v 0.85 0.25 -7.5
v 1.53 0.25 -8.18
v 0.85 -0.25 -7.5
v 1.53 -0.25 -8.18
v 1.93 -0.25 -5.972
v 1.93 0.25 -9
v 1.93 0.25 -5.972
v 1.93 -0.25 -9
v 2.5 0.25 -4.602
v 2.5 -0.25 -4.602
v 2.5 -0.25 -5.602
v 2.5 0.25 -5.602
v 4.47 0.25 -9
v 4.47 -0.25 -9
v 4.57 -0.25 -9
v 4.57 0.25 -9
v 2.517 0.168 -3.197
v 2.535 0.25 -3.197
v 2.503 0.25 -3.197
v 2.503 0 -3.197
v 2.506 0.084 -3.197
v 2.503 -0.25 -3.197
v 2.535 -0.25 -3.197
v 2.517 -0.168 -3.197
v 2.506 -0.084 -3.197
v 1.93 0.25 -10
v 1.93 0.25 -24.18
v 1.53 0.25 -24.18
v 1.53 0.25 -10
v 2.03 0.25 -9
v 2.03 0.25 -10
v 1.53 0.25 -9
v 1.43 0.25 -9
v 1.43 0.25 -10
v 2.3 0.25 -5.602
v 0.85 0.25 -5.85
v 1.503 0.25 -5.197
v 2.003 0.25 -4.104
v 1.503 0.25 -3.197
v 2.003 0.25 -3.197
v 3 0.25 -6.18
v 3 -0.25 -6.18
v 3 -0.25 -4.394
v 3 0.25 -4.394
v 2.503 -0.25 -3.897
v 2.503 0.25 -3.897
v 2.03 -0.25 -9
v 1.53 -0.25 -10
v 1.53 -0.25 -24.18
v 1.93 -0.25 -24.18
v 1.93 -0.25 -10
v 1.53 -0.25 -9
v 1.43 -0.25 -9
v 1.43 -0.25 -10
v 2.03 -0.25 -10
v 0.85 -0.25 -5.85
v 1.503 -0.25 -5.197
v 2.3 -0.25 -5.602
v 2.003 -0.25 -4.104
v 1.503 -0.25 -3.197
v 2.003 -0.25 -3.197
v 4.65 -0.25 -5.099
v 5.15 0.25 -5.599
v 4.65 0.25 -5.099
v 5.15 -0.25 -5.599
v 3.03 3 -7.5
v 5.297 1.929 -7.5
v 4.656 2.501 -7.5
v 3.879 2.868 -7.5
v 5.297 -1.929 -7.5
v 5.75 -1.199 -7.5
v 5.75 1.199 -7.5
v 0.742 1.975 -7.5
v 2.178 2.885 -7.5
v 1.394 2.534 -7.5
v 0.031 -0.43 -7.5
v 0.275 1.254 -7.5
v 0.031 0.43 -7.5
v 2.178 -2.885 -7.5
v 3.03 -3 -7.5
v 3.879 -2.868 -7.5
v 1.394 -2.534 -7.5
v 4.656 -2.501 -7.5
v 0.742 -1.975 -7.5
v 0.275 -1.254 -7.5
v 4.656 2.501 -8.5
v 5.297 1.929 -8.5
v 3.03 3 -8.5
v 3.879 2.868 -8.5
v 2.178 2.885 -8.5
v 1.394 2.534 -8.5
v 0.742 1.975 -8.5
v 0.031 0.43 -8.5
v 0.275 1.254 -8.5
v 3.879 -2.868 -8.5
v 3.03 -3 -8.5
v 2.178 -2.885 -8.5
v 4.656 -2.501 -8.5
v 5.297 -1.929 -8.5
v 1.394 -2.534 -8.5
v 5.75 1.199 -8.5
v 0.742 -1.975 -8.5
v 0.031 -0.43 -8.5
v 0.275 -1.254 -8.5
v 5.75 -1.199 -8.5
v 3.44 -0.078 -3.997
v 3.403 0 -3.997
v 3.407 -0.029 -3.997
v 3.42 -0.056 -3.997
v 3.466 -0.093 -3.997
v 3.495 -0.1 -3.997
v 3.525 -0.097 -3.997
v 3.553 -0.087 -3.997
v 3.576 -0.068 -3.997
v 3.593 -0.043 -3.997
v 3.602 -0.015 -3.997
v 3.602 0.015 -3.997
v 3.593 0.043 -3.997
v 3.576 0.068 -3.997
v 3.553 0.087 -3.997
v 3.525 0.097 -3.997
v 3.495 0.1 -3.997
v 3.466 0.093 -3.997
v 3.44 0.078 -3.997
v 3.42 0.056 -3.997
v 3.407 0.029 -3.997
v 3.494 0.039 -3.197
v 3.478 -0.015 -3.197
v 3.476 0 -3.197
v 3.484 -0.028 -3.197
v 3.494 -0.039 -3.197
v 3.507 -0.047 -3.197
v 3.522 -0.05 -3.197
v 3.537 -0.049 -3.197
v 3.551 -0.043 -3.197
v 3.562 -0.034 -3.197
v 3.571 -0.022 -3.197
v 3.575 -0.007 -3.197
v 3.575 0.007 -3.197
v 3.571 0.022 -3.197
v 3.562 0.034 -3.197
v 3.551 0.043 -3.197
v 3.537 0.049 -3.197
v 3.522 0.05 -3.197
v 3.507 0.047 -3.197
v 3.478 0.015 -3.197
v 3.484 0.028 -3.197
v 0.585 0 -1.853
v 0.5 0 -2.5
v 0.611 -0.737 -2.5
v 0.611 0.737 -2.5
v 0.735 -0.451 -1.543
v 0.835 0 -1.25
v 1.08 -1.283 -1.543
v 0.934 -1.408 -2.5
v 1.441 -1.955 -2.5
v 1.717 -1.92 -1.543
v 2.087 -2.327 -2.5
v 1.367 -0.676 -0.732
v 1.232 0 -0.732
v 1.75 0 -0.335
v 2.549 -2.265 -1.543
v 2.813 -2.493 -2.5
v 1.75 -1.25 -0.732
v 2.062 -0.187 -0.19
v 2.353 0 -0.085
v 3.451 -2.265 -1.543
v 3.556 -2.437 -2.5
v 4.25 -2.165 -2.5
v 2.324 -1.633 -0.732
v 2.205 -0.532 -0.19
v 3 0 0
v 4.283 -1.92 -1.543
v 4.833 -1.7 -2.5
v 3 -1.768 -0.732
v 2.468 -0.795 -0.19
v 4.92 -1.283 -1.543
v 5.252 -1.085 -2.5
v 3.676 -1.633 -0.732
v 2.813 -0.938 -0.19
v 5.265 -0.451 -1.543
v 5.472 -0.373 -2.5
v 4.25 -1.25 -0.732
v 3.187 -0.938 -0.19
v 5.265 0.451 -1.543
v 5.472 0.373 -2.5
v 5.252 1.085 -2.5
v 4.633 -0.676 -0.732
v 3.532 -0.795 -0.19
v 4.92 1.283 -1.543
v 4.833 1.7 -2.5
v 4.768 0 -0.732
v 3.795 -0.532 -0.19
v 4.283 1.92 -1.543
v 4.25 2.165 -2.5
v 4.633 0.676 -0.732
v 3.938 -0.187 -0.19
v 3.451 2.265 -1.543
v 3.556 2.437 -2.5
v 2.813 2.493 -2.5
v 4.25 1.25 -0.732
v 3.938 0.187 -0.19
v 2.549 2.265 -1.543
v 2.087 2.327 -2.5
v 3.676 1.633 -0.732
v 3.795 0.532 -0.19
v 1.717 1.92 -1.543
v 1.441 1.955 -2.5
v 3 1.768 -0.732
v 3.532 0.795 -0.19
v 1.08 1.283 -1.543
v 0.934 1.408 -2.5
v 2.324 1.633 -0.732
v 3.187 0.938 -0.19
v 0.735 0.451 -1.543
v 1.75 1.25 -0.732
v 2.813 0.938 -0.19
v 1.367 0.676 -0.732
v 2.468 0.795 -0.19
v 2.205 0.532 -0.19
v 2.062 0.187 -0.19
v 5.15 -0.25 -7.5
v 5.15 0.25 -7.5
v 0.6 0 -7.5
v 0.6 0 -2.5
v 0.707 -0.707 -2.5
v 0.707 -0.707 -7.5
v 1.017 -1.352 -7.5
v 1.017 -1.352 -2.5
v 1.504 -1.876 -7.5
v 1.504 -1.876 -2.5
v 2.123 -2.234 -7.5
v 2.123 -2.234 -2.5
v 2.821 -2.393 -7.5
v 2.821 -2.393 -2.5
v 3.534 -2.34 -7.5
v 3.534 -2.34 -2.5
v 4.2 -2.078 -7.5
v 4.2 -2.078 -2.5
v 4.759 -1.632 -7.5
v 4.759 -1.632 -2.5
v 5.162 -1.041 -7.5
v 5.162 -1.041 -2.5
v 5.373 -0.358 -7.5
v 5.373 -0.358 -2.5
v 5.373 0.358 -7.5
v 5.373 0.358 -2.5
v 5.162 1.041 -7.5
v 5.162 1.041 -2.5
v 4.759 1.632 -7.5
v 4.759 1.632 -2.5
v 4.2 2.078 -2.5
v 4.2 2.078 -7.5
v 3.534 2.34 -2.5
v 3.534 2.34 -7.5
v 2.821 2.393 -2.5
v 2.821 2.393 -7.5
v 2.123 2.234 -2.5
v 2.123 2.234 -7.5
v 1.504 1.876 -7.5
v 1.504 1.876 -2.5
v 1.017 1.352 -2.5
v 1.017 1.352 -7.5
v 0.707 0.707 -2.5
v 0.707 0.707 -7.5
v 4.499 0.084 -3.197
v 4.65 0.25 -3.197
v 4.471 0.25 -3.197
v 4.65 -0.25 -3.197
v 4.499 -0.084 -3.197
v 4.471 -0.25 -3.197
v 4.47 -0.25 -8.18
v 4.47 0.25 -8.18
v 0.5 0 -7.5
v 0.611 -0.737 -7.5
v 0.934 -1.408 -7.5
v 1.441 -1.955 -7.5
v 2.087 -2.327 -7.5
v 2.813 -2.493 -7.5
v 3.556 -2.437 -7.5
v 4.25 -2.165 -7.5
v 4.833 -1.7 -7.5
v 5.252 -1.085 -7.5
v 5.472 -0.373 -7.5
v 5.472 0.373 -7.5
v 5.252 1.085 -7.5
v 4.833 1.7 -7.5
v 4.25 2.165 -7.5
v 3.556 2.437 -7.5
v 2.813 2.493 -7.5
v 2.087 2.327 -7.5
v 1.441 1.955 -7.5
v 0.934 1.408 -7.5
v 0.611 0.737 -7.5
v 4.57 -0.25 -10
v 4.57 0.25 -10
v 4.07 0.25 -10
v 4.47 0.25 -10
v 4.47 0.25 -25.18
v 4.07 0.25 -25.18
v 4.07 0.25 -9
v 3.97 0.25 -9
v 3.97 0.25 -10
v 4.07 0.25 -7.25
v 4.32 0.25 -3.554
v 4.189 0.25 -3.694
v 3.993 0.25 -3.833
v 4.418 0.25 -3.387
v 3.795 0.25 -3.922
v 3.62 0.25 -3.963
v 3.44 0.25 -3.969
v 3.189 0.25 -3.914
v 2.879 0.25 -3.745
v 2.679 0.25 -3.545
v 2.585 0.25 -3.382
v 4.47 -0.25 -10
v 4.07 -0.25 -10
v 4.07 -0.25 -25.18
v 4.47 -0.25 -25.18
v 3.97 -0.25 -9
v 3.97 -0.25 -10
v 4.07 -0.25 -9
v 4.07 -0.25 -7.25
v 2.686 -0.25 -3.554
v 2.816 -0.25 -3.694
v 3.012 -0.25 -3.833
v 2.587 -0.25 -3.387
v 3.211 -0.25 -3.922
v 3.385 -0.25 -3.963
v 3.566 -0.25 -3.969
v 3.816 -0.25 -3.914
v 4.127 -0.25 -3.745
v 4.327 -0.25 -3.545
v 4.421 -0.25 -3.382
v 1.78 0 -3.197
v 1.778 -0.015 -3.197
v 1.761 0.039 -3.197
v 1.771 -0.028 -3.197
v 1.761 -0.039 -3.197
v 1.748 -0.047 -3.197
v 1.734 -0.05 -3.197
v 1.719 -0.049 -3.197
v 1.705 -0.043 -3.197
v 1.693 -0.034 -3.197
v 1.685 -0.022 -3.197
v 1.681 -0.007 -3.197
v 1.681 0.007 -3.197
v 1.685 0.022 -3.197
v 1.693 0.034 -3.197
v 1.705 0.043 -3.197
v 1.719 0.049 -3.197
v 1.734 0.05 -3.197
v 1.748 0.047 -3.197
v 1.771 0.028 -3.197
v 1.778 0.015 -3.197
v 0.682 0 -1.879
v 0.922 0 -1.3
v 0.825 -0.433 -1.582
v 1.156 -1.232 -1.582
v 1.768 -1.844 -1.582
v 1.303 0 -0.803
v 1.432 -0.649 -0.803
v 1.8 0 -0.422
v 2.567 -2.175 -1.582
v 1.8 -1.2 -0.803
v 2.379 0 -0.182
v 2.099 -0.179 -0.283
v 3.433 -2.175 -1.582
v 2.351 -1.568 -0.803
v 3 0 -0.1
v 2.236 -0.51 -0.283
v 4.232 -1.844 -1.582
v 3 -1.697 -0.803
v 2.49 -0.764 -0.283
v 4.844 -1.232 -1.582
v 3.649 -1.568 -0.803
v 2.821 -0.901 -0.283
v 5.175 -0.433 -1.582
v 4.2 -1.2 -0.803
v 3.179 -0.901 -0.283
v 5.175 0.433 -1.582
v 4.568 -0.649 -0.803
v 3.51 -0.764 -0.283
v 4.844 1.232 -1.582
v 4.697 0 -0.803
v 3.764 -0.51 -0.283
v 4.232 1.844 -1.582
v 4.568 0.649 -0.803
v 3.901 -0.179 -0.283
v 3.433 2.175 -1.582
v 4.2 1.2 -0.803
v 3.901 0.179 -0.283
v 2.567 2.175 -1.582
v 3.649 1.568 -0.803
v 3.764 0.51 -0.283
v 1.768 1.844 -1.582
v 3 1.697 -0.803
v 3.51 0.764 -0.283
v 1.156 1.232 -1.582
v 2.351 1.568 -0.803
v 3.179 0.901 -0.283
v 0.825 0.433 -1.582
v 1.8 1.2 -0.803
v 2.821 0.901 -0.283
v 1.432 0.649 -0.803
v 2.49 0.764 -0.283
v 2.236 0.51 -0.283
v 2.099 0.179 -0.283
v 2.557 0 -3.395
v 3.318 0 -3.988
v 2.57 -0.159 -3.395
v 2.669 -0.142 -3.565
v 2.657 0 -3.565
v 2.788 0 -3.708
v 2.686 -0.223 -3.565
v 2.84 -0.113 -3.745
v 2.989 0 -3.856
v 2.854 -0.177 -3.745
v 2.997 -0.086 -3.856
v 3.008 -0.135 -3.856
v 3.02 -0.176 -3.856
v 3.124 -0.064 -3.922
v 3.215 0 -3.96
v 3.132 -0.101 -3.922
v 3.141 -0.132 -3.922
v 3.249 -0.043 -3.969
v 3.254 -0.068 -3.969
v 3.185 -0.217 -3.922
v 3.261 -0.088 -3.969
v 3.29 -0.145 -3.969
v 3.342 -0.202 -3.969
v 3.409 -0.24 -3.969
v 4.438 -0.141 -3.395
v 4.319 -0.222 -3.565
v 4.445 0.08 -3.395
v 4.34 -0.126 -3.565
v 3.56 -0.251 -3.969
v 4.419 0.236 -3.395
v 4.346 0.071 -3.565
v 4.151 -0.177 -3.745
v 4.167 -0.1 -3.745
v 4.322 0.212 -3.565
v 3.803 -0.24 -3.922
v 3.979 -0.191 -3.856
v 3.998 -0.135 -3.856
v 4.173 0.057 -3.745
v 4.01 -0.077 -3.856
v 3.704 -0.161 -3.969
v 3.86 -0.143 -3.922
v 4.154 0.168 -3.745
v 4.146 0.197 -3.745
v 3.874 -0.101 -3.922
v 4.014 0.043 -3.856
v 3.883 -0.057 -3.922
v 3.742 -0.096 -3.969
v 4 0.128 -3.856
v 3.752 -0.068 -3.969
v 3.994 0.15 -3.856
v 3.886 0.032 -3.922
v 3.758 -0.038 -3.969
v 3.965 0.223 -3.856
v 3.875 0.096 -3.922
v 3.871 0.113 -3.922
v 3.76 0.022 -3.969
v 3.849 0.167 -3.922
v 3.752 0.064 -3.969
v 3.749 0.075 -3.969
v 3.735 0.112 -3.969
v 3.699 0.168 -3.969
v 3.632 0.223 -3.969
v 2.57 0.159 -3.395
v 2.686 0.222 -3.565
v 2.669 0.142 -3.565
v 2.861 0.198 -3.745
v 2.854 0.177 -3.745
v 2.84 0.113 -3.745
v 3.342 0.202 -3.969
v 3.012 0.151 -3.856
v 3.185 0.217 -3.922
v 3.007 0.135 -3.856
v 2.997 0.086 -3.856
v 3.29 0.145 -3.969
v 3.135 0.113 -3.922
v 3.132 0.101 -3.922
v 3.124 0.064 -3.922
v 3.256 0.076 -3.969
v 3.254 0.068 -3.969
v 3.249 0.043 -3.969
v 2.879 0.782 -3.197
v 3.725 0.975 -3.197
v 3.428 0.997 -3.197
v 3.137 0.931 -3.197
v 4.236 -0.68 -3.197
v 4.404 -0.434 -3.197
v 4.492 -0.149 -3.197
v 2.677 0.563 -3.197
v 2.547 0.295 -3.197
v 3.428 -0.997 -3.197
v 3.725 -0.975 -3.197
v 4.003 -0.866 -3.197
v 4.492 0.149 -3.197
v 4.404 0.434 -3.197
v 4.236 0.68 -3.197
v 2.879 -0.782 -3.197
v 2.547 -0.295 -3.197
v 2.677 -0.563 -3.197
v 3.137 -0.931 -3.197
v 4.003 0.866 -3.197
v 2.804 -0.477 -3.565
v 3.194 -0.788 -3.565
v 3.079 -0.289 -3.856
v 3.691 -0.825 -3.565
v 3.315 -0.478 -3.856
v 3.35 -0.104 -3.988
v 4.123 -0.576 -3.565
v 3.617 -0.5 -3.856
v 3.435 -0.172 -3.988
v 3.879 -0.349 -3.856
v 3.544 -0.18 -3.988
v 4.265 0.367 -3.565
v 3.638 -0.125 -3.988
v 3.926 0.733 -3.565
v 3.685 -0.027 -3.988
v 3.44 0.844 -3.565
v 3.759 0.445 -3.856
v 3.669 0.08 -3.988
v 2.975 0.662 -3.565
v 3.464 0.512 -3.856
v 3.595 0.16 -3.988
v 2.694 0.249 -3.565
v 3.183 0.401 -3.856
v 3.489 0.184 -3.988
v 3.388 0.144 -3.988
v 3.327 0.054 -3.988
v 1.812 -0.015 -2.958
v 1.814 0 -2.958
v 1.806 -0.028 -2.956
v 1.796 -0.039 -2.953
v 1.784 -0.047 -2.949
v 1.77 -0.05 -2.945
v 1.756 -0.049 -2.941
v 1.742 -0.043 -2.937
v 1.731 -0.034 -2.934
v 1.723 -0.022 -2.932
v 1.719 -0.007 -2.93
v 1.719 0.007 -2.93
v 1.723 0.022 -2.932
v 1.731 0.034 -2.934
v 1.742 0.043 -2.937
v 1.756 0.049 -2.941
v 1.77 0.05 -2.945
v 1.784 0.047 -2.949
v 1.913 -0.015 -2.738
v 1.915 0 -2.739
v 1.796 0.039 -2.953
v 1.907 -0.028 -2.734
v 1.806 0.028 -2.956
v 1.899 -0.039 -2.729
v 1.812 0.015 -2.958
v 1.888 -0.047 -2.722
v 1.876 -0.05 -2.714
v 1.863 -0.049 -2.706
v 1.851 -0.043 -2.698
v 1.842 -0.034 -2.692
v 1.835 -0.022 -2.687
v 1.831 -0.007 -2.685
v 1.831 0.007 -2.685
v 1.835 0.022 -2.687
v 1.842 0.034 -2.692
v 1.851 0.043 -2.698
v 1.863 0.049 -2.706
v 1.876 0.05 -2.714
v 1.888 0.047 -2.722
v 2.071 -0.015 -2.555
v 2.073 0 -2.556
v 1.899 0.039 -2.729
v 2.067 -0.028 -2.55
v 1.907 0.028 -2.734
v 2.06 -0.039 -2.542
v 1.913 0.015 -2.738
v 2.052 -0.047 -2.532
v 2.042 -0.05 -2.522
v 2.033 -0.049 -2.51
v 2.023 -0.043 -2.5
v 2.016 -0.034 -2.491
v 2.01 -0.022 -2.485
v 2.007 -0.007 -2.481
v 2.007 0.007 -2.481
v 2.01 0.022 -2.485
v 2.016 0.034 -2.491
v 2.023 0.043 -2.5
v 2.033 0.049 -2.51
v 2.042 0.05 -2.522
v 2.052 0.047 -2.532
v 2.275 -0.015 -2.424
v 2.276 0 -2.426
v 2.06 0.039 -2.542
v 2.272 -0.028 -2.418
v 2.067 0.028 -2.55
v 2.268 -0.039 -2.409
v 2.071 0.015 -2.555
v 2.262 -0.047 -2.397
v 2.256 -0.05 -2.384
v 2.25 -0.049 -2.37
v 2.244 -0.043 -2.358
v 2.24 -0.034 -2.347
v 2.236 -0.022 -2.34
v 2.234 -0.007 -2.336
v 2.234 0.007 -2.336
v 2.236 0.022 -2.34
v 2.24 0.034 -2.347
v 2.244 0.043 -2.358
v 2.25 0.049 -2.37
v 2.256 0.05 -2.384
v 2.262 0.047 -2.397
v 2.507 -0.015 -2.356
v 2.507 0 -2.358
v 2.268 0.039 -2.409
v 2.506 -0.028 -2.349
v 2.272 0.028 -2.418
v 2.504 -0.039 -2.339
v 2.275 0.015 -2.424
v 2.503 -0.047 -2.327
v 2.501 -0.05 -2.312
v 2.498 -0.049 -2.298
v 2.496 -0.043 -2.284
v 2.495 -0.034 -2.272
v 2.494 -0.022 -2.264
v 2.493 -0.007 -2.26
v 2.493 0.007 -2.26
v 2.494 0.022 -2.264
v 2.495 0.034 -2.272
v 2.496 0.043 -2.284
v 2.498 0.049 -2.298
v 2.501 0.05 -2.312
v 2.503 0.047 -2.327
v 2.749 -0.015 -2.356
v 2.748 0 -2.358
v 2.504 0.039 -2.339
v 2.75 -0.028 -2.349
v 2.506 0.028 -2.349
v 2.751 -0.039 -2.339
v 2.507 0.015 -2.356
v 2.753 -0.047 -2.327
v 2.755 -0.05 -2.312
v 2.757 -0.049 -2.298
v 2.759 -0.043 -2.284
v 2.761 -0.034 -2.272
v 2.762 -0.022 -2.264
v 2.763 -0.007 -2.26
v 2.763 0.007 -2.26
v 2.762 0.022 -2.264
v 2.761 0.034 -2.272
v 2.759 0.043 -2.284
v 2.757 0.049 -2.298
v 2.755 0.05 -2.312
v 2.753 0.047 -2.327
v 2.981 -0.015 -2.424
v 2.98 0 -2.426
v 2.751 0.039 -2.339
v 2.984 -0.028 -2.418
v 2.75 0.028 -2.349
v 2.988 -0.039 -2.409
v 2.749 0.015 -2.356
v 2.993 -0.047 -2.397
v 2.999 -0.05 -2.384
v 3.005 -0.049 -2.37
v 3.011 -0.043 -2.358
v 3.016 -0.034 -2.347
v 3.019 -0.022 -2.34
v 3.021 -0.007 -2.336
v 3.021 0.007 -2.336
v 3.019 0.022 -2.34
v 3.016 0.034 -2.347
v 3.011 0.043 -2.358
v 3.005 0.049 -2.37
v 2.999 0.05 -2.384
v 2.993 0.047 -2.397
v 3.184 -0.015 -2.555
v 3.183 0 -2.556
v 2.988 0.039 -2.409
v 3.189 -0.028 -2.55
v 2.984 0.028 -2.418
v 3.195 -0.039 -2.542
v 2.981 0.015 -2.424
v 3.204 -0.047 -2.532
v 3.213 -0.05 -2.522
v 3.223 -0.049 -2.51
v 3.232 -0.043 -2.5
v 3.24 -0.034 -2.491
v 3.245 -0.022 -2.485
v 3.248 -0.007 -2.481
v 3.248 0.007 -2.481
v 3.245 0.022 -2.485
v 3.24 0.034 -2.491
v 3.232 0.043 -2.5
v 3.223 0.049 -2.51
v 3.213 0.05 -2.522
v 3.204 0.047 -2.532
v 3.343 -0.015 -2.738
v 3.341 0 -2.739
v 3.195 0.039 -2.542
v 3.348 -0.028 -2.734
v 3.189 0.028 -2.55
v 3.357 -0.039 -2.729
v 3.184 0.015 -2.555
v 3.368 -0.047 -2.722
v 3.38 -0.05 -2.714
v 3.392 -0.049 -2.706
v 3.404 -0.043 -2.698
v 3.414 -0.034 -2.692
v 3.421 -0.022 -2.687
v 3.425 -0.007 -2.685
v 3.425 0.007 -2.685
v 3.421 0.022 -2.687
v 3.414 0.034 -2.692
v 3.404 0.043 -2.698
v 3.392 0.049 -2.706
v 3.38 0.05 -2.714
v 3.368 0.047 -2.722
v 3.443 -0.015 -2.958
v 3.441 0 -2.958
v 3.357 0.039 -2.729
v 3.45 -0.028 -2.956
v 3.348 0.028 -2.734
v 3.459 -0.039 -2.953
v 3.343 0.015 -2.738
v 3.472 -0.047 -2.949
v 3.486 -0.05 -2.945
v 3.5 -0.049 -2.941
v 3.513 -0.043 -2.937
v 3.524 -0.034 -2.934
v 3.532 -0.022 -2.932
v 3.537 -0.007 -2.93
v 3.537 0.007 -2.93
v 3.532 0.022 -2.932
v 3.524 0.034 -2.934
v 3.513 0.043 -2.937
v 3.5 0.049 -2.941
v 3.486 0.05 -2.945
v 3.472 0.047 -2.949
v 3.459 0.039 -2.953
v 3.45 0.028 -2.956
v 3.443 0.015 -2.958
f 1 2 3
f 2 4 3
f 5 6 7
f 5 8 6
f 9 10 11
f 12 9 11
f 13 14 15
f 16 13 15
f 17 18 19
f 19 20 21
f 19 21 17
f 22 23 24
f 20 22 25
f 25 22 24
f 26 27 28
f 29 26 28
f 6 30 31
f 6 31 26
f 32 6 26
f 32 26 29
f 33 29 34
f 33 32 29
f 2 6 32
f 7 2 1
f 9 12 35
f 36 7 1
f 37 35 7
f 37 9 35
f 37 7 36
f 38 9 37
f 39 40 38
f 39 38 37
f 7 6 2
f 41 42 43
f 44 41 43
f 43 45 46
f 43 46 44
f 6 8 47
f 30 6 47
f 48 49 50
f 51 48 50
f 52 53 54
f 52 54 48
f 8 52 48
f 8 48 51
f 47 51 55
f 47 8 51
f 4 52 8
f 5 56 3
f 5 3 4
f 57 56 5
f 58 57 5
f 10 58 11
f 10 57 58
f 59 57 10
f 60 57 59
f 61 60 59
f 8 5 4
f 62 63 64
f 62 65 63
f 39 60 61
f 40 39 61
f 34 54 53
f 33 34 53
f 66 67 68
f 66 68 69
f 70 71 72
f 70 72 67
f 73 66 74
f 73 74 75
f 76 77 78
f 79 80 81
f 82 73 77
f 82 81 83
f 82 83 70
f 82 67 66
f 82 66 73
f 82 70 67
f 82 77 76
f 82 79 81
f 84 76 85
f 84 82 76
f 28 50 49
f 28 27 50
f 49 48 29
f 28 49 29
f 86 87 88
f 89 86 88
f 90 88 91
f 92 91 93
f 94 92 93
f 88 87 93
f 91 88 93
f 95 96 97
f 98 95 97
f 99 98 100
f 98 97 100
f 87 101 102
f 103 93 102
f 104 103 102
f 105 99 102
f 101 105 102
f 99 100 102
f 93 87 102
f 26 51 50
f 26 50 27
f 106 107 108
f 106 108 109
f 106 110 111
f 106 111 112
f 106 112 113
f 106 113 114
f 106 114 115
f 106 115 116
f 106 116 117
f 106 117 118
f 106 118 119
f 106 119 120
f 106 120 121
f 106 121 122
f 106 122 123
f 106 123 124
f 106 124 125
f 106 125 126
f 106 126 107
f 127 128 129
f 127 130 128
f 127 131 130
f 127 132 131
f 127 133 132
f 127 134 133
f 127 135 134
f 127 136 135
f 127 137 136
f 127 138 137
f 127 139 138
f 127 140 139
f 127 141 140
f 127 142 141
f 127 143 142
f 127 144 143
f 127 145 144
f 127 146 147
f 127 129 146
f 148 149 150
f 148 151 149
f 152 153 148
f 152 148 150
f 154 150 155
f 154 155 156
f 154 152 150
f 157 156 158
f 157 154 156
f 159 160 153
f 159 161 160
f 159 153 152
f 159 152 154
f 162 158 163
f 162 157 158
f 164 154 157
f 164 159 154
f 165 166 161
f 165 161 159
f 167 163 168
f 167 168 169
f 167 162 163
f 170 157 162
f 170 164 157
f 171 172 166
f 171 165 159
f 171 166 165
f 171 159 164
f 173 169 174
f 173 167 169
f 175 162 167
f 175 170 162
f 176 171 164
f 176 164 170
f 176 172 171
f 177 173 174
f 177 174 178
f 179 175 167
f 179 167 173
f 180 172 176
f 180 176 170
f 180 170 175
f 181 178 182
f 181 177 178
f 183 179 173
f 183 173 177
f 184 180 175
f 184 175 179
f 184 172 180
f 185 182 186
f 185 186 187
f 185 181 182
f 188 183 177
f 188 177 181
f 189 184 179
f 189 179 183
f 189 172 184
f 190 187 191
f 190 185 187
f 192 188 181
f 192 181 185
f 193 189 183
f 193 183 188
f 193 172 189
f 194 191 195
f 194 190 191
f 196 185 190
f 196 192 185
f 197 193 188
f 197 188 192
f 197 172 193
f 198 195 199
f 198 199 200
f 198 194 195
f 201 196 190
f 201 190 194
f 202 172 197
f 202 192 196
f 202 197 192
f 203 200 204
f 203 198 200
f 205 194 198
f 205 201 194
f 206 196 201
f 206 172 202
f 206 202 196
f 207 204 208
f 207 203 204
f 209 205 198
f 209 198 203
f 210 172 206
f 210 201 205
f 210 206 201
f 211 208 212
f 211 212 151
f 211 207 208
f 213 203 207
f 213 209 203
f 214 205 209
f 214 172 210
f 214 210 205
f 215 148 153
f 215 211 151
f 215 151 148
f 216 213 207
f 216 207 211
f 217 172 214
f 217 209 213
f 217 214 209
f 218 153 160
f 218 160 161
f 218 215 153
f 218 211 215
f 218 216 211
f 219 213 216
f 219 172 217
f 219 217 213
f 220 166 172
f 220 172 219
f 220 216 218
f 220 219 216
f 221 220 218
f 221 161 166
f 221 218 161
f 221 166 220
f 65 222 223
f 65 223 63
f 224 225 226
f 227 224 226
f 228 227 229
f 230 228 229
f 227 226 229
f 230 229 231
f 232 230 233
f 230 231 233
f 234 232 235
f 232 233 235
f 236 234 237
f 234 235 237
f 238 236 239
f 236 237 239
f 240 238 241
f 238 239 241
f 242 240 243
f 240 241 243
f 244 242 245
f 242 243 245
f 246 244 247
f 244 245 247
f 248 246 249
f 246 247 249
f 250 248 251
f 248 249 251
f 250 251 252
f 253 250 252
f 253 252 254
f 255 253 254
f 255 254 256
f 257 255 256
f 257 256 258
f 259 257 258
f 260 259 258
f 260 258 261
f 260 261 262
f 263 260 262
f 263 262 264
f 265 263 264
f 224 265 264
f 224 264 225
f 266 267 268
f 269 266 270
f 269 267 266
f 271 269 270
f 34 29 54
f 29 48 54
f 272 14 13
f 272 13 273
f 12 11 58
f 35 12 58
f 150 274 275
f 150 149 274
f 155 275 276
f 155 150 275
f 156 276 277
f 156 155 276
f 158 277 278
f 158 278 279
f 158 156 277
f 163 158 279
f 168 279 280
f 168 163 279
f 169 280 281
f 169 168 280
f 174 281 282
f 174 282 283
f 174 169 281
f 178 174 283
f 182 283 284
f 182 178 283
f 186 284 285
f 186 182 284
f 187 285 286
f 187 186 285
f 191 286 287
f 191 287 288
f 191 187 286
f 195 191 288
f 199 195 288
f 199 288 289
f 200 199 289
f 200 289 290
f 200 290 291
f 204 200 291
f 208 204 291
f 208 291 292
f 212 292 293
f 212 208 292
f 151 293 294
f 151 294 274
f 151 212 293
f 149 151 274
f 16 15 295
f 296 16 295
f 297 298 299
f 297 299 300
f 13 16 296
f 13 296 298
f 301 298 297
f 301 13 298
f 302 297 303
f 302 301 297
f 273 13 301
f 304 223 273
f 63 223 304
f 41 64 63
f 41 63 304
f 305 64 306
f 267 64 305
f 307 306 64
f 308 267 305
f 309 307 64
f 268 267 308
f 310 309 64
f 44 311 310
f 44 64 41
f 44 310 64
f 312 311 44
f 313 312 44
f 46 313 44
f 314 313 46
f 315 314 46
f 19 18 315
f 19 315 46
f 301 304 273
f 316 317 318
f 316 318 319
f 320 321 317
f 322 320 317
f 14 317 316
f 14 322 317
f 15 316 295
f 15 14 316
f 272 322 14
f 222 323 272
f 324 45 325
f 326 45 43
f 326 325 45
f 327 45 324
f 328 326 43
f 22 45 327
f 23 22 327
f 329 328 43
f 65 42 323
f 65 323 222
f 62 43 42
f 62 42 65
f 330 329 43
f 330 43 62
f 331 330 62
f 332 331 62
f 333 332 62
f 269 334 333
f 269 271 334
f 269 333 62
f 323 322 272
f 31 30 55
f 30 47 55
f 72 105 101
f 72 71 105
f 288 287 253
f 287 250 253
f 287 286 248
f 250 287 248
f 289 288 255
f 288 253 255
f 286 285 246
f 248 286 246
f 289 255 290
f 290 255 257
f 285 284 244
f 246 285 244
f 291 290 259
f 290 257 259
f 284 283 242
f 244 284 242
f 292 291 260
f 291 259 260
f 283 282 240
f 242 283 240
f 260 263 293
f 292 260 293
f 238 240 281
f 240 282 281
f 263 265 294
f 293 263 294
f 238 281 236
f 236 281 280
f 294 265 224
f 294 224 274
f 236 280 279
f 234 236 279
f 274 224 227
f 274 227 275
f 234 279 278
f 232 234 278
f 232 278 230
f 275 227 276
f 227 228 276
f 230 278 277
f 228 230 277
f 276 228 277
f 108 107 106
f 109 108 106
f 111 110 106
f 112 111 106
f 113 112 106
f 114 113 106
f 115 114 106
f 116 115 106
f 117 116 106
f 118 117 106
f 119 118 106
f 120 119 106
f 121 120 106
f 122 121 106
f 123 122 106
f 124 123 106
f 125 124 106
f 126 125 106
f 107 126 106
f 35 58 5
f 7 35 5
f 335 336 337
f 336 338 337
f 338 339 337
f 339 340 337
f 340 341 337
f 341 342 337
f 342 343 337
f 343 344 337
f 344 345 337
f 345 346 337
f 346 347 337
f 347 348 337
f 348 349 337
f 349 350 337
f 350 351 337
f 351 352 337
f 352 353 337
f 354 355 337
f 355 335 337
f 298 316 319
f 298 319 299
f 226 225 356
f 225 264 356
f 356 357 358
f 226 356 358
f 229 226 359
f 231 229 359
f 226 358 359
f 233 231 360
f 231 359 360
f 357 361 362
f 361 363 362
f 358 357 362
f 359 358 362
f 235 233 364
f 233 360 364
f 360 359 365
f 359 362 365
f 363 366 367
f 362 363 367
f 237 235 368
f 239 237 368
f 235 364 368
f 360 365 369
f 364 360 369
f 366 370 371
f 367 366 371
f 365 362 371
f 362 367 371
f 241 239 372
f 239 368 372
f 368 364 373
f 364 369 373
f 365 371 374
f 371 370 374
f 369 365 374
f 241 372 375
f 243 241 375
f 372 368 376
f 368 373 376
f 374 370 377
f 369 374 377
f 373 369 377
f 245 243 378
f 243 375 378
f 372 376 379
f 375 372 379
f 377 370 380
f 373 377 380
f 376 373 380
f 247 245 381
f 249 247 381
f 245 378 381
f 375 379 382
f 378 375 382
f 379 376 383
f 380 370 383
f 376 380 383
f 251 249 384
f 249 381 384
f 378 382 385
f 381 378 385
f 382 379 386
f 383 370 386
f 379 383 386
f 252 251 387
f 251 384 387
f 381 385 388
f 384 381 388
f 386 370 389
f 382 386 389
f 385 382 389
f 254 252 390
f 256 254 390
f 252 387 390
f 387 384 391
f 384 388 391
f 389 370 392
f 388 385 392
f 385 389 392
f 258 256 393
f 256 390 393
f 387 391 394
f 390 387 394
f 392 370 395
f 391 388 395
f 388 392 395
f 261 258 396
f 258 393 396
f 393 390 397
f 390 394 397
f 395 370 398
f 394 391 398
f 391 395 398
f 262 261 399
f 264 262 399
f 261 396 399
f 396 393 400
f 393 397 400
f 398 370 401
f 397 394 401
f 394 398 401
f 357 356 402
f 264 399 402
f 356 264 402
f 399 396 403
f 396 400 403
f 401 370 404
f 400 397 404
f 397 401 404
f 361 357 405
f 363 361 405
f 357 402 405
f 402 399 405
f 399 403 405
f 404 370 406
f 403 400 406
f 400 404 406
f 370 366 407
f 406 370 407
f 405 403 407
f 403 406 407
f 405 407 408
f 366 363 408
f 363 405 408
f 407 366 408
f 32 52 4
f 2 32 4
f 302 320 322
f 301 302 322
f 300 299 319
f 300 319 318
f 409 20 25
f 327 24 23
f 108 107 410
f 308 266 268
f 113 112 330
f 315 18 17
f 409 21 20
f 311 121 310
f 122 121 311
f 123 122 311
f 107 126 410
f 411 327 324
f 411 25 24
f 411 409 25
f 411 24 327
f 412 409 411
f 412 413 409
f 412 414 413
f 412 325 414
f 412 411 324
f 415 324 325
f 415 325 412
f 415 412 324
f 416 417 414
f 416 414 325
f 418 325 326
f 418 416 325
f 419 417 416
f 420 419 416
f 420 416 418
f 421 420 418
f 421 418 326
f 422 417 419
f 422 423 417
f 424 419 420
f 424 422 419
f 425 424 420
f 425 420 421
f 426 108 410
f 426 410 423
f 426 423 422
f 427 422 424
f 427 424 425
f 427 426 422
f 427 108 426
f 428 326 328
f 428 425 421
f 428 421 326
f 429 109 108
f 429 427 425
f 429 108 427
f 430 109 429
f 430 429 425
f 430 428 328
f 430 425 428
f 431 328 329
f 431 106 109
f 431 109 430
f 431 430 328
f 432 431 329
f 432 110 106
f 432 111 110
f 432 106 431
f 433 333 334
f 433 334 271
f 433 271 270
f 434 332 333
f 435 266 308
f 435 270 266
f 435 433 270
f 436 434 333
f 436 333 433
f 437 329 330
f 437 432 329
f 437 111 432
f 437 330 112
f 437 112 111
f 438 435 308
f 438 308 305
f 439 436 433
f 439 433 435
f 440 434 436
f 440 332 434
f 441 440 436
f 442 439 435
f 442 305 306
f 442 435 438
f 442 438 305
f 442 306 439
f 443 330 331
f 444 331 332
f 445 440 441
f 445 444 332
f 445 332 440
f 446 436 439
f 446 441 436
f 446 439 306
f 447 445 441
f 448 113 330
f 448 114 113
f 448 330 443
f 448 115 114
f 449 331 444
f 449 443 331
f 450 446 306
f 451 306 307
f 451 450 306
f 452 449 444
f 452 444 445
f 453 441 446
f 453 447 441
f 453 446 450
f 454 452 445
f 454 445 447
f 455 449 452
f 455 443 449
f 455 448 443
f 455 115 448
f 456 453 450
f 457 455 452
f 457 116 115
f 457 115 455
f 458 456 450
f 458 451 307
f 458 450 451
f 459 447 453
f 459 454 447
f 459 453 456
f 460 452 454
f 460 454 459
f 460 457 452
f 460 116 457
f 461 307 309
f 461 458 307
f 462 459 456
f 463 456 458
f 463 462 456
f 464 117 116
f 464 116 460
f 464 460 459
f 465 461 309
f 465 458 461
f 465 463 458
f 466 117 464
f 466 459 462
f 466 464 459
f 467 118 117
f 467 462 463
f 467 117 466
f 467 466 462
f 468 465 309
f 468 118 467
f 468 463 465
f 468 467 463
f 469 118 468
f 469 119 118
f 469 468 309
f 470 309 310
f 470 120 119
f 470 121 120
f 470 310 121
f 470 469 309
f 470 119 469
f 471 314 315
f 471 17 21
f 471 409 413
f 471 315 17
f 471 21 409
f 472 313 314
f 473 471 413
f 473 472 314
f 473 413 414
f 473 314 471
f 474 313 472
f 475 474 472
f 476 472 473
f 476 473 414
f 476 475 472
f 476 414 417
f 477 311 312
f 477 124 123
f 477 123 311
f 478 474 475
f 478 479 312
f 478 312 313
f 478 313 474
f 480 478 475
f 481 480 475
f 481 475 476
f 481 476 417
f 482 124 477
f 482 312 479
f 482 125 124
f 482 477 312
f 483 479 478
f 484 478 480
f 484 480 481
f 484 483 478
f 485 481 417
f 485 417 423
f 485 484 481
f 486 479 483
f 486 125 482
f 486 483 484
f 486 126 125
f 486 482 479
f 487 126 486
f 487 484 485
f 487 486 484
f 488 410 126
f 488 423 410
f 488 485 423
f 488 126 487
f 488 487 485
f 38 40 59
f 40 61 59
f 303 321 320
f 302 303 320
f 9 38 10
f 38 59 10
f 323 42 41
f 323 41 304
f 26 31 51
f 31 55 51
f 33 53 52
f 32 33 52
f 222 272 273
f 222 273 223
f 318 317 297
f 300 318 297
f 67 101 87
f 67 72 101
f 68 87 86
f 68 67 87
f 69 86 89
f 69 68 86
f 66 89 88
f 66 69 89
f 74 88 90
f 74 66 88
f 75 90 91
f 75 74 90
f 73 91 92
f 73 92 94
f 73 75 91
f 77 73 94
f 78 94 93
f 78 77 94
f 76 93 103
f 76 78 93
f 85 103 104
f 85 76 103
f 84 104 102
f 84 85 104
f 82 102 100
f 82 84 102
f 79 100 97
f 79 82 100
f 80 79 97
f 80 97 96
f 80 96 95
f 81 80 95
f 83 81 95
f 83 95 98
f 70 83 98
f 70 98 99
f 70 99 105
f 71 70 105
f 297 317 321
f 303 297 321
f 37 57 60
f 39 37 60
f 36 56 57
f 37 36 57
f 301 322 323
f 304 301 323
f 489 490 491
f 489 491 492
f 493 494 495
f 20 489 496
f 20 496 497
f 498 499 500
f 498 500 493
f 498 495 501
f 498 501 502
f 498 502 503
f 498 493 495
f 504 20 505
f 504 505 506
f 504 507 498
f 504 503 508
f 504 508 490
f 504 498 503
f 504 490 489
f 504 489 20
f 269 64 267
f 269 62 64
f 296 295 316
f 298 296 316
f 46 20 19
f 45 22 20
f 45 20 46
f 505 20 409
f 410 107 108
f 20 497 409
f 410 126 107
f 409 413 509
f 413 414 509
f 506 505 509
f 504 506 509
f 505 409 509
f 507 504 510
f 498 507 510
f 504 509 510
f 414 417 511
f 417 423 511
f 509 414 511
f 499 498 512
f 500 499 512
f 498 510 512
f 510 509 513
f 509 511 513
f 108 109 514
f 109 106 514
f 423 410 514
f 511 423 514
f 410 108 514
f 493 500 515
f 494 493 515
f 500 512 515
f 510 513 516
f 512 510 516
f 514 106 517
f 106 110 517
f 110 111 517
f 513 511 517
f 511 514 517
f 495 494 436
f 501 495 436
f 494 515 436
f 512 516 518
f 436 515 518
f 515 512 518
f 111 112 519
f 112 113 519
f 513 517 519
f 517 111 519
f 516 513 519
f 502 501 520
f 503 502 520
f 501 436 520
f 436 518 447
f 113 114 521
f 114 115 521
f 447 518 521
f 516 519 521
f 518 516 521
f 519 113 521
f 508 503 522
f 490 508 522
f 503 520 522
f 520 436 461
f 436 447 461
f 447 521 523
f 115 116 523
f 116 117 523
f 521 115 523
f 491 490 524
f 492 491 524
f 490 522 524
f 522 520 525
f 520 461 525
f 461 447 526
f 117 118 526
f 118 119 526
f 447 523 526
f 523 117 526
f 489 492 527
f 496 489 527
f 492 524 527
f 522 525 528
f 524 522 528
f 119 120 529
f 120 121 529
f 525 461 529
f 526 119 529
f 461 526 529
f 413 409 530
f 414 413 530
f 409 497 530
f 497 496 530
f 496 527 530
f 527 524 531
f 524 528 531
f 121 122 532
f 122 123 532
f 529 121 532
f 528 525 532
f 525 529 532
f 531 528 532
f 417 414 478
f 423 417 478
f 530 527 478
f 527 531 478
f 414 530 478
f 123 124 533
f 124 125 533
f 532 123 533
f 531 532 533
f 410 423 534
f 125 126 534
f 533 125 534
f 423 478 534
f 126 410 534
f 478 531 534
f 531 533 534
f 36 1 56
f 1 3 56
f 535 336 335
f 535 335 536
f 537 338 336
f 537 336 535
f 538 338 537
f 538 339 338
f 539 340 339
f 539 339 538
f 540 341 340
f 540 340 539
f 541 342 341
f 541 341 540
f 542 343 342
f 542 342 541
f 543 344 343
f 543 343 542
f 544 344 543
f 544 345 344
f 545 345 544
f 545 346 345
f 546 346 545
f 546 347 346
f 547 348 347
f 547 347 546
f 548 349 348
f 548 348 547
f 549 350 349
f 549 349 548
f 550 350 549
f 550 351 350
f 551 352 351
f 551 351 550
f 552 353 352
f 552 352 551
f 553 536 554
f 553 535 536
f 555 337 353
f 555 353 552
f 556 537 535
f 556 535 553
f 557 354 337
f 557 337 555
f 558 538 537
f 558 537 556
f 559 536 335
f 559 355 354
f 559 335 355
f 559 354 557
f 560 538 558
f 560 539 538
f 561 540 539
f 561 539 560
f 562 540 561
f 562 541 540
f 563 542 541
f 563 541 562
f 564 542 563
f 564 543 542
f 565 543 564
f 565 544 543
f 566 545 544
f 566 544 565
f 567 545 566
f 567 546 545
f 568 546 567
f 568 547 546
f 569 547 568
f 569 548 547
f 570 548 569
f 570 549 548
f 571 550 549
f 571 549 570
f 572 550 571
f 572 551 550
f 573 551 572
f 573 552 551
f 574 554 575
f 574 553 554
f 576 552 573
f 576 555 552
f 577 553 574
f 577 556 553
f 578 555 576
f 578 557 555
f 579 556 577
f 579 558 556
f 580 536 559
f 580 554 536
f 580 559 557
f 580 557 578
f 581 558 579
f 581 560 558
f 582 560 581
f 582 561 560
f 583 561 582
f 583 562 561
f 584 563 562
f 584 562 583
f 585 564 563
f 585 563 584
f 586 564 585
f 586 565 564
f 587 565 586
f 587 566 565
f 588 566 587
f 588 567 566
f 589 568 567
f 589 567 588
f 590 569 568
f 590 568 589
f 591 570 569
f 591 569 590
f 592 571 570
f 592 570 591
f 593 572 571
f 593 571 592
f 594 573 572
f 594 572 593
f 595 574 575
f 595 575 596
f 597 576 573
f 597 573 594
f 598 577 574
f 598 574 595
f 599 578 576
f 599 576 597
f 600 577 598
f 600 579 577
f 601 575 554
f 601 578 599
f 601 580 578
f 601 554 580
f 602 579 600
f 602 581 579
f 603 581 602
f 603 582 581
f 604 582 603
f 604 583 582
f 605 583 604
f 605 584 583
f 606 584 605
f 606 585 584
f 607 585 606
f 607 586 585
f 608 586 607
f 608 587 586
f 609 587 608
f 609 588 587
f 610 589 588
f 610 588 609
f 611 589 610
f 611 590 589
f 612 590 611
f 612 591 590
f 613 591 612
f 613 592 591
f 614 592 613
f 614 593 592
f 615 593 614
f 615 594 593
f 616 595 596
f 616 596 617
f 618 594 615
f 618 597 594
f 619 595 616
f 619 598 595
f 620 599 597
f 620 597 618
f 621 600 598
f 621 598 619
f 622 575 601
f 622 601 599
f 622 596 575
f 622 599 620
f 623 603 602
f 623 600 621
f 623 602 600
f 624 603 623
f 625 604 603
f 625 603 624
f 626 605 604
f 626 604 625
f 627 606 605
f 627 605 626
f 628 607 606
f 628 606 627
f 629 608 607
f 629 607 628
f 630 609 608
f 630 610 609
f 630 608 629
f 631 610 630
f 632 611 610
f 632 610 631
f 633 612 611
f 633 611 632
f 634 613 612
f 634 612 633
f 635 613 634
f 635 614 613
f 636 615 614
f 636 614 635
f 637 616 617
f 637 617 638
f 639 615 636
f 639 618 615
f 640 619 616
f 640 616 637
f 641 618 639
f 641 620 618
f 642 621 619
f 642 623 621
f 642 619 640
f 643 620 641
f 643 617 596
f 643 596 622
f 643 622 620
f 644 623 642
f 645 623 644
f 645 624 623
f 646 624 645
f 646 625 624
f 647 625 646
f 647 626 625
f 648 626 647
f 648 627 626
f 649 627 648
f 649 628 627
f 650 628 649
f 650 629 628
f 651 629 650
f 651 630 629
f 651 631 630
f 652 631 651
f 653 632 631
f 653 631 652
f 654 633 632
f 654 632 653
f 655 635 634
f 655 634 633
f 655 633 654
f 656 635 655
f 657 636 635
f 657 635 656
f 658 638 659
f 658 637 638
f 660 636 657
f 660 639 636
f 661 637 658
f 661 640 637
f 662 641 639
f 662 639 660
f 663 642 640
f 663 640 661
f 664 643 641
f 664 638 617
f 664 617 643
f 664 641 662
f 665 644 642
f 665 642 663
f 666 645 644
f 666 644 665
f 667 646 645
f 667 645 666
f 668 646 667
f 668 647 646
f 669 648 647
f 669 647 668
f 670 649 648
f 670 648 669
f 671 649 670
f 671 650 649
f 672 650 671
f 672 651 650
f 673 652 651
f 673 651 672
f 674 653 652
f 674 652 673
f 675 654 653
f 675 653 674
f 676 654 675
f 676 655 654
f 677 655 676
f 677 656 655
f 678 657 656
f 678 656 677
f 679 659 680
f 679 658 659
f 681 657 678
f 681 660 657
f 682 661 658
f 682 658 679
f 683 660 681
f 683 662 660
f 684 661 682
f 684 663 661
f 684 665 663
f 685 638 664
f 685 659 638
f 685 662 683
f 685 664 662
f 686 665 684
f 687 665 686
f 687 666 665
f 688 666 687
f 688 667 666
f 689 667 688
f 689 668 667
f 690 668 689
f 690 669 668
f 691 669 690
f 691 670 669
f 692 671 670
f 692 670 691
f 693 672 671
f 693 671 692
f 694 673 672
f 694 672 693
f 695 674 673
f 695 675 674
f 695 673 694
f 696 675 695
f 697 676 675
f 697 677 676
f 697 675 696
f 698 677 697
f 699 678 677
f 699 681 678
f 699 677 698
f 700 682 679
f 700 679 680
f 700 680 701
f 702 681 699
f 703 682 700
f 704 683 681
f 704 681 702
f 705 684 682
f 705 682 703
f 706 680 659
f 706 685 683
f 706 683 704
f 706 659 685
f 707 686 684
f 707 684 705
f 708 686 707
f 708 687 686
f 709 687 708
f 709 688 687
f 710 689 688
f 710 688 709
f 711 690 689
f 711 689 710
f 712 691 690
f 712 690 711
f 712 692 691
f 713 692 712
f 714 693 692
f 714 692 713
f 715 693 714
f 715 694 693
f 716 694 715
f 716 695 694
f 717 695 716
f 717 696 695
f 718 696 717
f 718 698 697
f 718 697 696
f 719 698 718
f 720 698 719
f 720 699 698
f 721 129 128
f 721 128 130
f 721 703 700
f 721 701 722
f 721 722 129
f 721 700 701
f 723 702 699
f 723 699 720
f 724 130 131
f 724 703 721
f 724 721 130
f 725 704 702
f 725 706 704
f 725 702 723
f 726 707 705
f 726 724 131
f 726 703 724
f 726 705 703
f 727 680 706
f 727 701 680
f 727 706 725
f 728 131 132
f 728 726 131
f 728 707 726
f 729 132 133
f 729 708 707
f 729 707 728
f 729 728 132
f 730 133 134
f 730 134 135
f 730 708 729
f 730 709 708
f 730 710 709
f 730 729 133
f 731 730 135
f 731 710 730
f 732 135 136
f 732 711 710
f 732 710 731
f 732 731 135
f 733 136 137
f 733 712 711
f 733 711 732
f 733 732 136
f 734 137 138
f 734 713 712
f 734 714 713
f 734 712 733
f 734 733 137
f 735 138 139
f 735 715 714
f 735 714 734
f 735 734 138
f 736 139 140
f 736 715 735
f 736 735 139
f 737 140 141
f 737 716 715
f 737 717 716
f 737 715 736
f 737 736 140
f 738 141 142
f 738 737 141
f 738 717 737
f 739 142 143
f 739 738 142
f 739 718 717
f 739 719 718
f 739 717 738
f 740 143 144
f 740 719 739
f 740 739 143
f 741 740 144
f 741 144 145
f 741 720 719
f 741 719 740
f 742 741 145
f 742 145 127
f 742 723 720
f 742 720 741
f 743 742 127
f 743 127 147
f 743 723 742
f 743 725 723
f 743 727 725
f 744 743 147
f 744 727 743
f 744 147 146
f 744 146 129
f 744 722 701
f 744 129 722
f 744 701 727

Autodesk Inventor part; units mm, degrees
ref_plane "YZ Plane" through (0, 0, 0) normal (1, 0, 0) x (0, 1, 0)
ref_plane "XZ Plane" through (0, 0, 0) normal (0, 1, 0) x (-1, 0, 0)
ref_plane "XY Plane" through (0, 0, 0) normal (0, 0, 1) x (1, 0, 0)
sketch "Sketch1" plane through (0, 0, 0) normal (0, 1, 0) x (-1, 0, 0)
  line L0 (-1.93, -19.18) -> (-1.53, -19.18)
  line L1 (-4.47, -20.18) -> (-4.07, -20.18)
  line L2 (-0.5, -2.5) -> (-5.5, -2.5) construction
  line L3 (-5.5, -2.5) -> (-5.5, -7.5)
  line L4 (-5.5, -7.5) -> (-0.5, -7.5)
  line L5 (-0.5, -7.5) -> (-0.5, -2.5)
  line L6 (0, -7.5) -> (-6, -7.5)
  line L7 (-6, -7.5) -> (-6, -8.5)
  line L8 (-6, -8.5) -> (0, -8.5)
  line L9 (0, -8.5) -> (0, -7.5)
  arc A0 (-0.5, -2.5) -> (-5.5, -2.5) centre (-3, -2.5) ccw
  line L10 (0, -24.216) -> (0, 4.0361) projected
  line L11 (17.1925, 0) -> (-9.8654, 0) projected
  line L12 (-3, -8.5) -> (-3, -19.8408) construction
  line L13 (-1.53, -19.18) -> (-1.53, -10)
  line L14 (-1.93, -19.18) -> (-1.93, -10)
  line L15 (-4.07, -20.18) -> (-4.07, -10)
  line L16 (-4.47, -20.18) -> (-4.47, -10)
  line L17 (-3, -8.5) -> (-3, 0)
  line L18 (-6, -19.8408) -> (0, -19.8408) construction
  line L19 (-1.43, -9) -> (-1.53, -9)
  line L20 (-2.03, -9) -> (-2.03, -10)
  line L21 (-2.03, -10) -> (-1.93, -10)
  line L22 (-1.43, -10) -> (-1.43, -9)
  line L23 (-3.97, -9) -> (-4.07, -9)
  line L24 (-4.57, -9) -> (-4.57, -10)
  line L25 (-4.57, -10) -> (-4.47, -10)
  line L26 (-3.97, -10) -> (-3.97, -9)
  line L27 (-1.93, -9) -> (-2.03, -9)
  line L28 (-4.07, -9) -> (-4.07, -7.25)
  line L29 (-4.47, -9) -> (-4.57, -9)
  line L30 (-4.07, -10) -> (-3.97, -10)
  line L31 (-1.53, -10) -> (-1.43, -10)
  line L32 (-4.47, -9) -> (-4.47, -8.18)
  line L33 (-1.93, -9) -> (-1.93, -5.9716)
  line L34 (-1.53, -9) -> (-1.53, -8.18)
  line L35 (-4.47, -8.18) -> (-5.15, -7.5)
  line L36 (-1.53, -8.18) -> (-0.85, -7.5)
  line L37 (-0.85, -7.5) -> (-0.85, -5.85)
  line L38 (-5.15, -7.5) -> (-5.15, -5.5986)
  line L39 (-5.15, -5.5986) -> (-4.65, -5.0986)
  line L40 (-4.65, -5.0986) -> (-4.65, -3.1972)
  line L41 (-4.65, -3.1972) -> (-2.5028, -3.1972)
  line L42 (-0.85, -5.85) -> (-1.5028, -5.1972)
  line L43 (-1.5028, -5.1972) -> (-1.5028, -3.1972)
  line L44 (-1.5028, -3.1972) -> (-2.0028, -3.1972)
  line L45 (-2.0028, -3.1972) -> (-2.0028, -4.1043)
  line L46 (-2.0028, -4.1043) -> (-2.5, -4.6016)
  line L47 (-2.5, -4.6016) -> (-2.5, -5.6016)
  line L48 (-2.5, -5.6016) -> (-2.3, -5.6016)
  line L49 (-2.3, -5.6016) -> (-1.93, -5.9716)
  line L50 (8.8309, -12.5892) -> (8.8309, -17.0713)
  line L51 (8.7309, -12.5892) -> (8.8309, -12.5892)
  line L52 (8.8309, -17.0713) -> (9.3309, -17.0713)
  line L53 (9.3309, -17.0713) -> (9.3309, -12.5892)
  line L54 (11.3309, -18.2444) -> (11.8309, -18.2444)
  line L55 (11.3309, -12.5815) -> (11.3309, -18.2444)
  line L56 (11.8309, -18.2444) -> (11.8309, -12.5815)
  line L57 (8.2266, -6.0537) -> (8.2266, -7.4999)
  line L58 (8.5861, -5.6941) -> (8.2266, -6.0537)
  line L59 (8.5861, -4.3452) -> (8.5861, -5.6941)
  line L60 (8.2266, -7.4999) -> (8.8309, -8.1043)
  line L61 (9.3309, -7.3282) -> (9.7365, -6.9226)
  line L62 (9.7365, -6.9226) -> (10.3309, -6.9226)
  line L63 (10.3309, -6.9226) -> (10.3309, -5.844)
  line L64 (8.5861, -4.3452) -> (11.2106, -4.3452)
  line L65 (10.8309, -6.0512) -> (10.8309, -6.9149)
  line L66 (10.8309, -6.9149) -> (11.1527, -6.9149)
  line L67 (11.2393, -4.3452) -> (11.2106, -4.3452)
  line L68 (11.1527, -6.9149) -> (11.3309, -7.0932)
  line L69 (11.8309, -8.0966) -> (12.4276, -7.4999)
  line L70 (12.4276, -7.4999) -> (12.4276, -5.8553)
  line L71 (9.4309, -11.5892) -> (9.3309, -11.5892)
  line L72 (11.8309, -11.5815) -> (11.8309, -8.0966)
  line L73 (8.8309, -8.1043) -> (8.8309, -11.5892)
  line L74 (11.3309, -7.0932) -> (11.3309, -11.5815)
  line L75 (9.3309, -11.5892) -> (9.3309, -7.3282)
  line L76 (10.3309, -5.844) -> (11.2106, -4.9643)
  line L77 (11.7107, -5.1714) -> (10.8309, -6.0512)
  line L78 (11.2106, -4.3452) -> (11.2393, -4.3452) construction
  line L79 (12.4276, -5.8553) -> (12.2082, -5.6359)
  line L80 (11.2106, -4.2719) -> (11.2106, -4.3452)
  line L81 (11.2106, -4.9643) -> (11.2106, -4.2719)
  line L82 (11.2106, -4.2719) -> (11.2393, -4.3452)
  line L83 (11.7107, -4.3453) -> (11.7107, -5.1714)
  line L84 (10.8445, -3.7709) -> (11.3445, -3.7709) construction
  spline S0 degree 3 poles (11.9954, -4.3997) (11.9862, -4.3486) (11.9578, -4.2521) (11.8889, -4.1254) (11.7974, -4.0171) (11.6749, -3.9177) (11.5186, -3.8358) (11.3301, -3.782) (11.1322, -3.7647) (10.9338, -3.7851) (10.7437, -3.8443) (10.5851, -3.9352) (10.4598, -4.0478) (10.3654, -4.1727) (10.2931, -4.3216) (10.262, -4.4371) (10.2513, -4.4991) knots 0 0 0 0 0.0625 0.125 0.1875 0.25 0.333333 0.416667 0.5 0.583333 0.666667 0.75 0.8125 0.875 0.9375 1 1 1 1
  line L85 (12.2082, -4.3453) -> (11.7107, -4.3453)
  line L86 (12.2082, -5.6359) -> (12.2082, -4.3453)
  line L87 (9.3309, -12.5892) -> (9.4309, -12.5892)
  line L88 (11.2309, -12.5815) -> (11.3309, -12.5815)
  line L89 (11.8309, -12.5815) -> (11.9309, -12.5815)
  line L90 (8.7309, -11.5892) -> (8.7309, -12.5892)
  line L91 (8.8309, -11.5892) -> (8.7309, -11.5892)
  line L92 (9.4309, -12.5892) -> (9.4309, -11.5892)
  line L93 (11.3309, -11.5815) -> (11.2309, -11.5815)
  line L94 (11.2309, -11.5815) -> (11.2309, -12.5815)
  line L95 (11.9309, -12.5815) -> (11.9309, -11.5815)
  line L96 (11.9309, -11.5815) -> (11.8309, -11.5815)
  line L97 (13.3271, -7.4999) -> (7.3271, -7.4999)
  line L98 (7.3271, -7.4999) -> (7.3271, -8.4999)
  line L99 (7.3271, -8.4999) -> (13.3271, -8.4999)
  line L100 (13.3271, -8.4999) -> (13.3271, -7.4999)
  line L101 (12.4276, -7.4999) -> (8.2266, -7.4999)
  line L102 (12.8271, -7.4999) -> (7.8271, -7.4999)
  line L103 (7.8271, -7.4999) -> (7.8271, -2.4999)
  line L104 (7.8271, -2.4999) -> (12.8271, -2.4999) construction
  line L105 (12.8271, -2.4999) -> (12.8271, -7.4999)
  arc A1 (12.8271, -2.4999) -> (7.8271, -2.4999) centre (10.3271, -2.4999) ccw
  line L106 (-2.5028, -3.1972) -> (-2.5028, -3.8972)
  line L107 (-2.5028, -3.8972) -> (-3, -4.3944)
  line L108 (-3, -4.3944) -> (-3, -5.9975)
  line L109 (-3, -6.18) -> (-4.07, -7.25)
  line L110 (-2.5028, -3.1972) -> (-2.0028, -3.1972) construction
  line L111 (-2.5, -5.6016) -> (-3, -5.9975) construction
  point P0 (0, 0)
  point P1 (-3, -7.5)
  point P2 (0, -8)
  point P3 (-1.73, -19.18)
  point P4 (-4.27, -20.18)
  point P5 (-3, -7.5)
  point P6 (0, 0)
  point P7 (7.8271, -7.4999)
  point P8 (10.3271, -7.4999)
  point P9 (-3, -5.196)
  point P10 (-3, -4.3944)
  point P11 (-3, -3.1972)
  dimension "d10" = 5
  dimension "d12" = 6
  dimension "d13" = 5
  dimension "d14" = 6
  dimension "Jarak_Kaki" = 2.54
  dimension "d18" = 1
  dimension "d19" = 0.4
  dimension "d20" = 1.27
  dimension "Panjang_Kaki" = 12
  dimension "d30" = 0.6
  dimension "d31" = 1
  dimension "d32" = 0.5
  dimension "d34" = 135
  dimension "d35" = 0.35
  dimension "d51" = 0.5
  dimension "d76" = 1.65
  dimension "d82" = 2.5
  dimension "d83" = 0.5
  dimension "d84" = 0.5
  dimension "d85" = 1
  dimension "d86" = 0.5
  dimension "d87" = 0.5
  dimension "d89" = 0.7
  dimension "d92" = 0.5
  dimension "d93" = 0.25
  dimension "d95" = 1
  dimension "d104" = 0.2
  dimension "d106" = 2
revolve "Revolution1" add sketch "Sketch1" angle 360 about axis through (3, 0, -8.5) along (0, 0, 1) contours L33 L49 L48 L47 L46 L45 L44 L43 L42 L37 L4 | L4 L17 L107 L106 L41 A0 L5 L37 L42 L43 L44 L45 L46 L47 L48 L49 L33 | L17 L41 L106 L107
shell "Shell1" thickness 0.1 removed faces 1 at (3.6238, -0.5526, -7.5)
revolve "Revolution2" add sketch "Sketch1" angle 360 about axis through (3, 0, -8.5) along (0, 0, 1) separate body contours L33 L4 L36 L34 L8 | L8 L17 L4 L33 | L34 L36 L4 L6 L9 L8
sketch "Sketch2" plane through (3, 0, -7.5) normal (0, 0, 1) x (1, 0, 0)
  line L0 (2.75, 2.5) -> (3.75, 2.5)
  line L1 (3.75, 2.5) -> (3.75, -2.5)
  line L2 (3.75, -2.5) -> (2.75, -2.5)
  line L3 (2.75, -2.5) -> (2.75, 2.5)
  circle A0 centre (0, 0) radius 2.5 projected
  circle A1 centre (0, 0) radius 2.5 projected
  line L4 (-3, -4.2) -> (-3, 4.2) construction
  line L5 (2.5, -1.6681) -> (2.5, 1.3873) construction
  line L6 (-4.368, 0) -> (5.2078, 0) projected
  point P0 (-3, 0)
  point P1 (2.75, 0)
  dimension "d110" = 0.25
  dimension "d111" = 5
  dimension "d112" = 1
extrude "Extrusion1" cut sketch "Sketch2" against normal up to next contours L0 L1 L6 L3 | L6 L1 L2 L3 bodies 2
extrude "Extrusion2" add sketch "Sketch1" along normal mid plane 0.5 separate body contours L14 L21 L20 L27 L33 L8 L34 L19 L22 L31 L13 L0 | L33 L4 L36 L34 L8 | L33 L49 L48 L47 L46 L45 L44 L43 L42 L37 L4 | L28 L23 L26 L30 L15 L1 L16 L25 L24 L29 L32 L8 | L8 L32 L35 L4 L28 | L4 L38 L39 L40 L41 L17 L109 L28 | L17 L41 L106 L107
sketch "Sketch3" plane through (2.4, 0, -4) normal (0, 1, 0) x (1, 0, 0)
  line L0 (0.1028, -0.1028) -> (0.1028, -0.8028) projected
  line L1 (0.1028, -0.8028) -> (0.1694, -0.2824) construction
  line L2 (0.1694, -0.2824) -> (0.7748, -0.0028) construction
  line L3 (0.7748, -0.0028) -> (1.0028, -0.0028) construction
  spline S0 degree 3 poles (0.1028, -0.8028) (0.1694, -0.2824) (0.7748, -0.0028) (1.0028, -0.0028) knots 1 1 1 1 2 2 2 2
  line L4 (0.1028, -0.8028) -> (2.25, -0.8028) projected
  line L5 (1.0028, -0.0028) -> (1.1028, -0.0028)
  line L6 (1.1028, -0.0028) -> (1.1028, -0.8028)
  dimension "d99" = 0.8
  dimension "d100" = 0.9
  dimension "d101" = 0.1
revolve "Revolution3" cut sketch "Sketch3" angle 360 about axis through (3.5028, 0, -3.9972) along (0, 0, 1) bodies 3
revolve "Revolution4" add sketch "Sketch3" angle 360 about axis through (3.5028, 0, -3.9972) along (0, 0, 1) separate body
sketch "Sketch4" plane through (3.5028, 0, -3.1972) normal (0, 0, 1) x (1, 0, 0)
  circle A0 centre (-1.7728, 0) radius 0.05
  line L0 (-2, -0.25) -> (-2, 0.25) construction
  line L1 (-2, 0.25) -> (-1.5, 0.25) construction
  line L2 (-1.5728, 0.25) -> (-1.9728, 0.25) construction
  line L3 (-2, 0) -> (-1.7728, 0) construction
  line L4 (-1.7728, 0) -> (-1.7728, 0.25) construction
  line L5 (-1.7728, 0.25) -> (-2, 0.25) construction
  line L6 (-2, 0.25) -> (-2, 0) construction
  circle A1 centre (0, 0) radius 0.05
  point P0 (-3.5028, 0)
  dimension "d109" = 0.1
sketch "Sketch5" plane through (0, 0, 0) normal (0, 1, 0) x (-1, 0, 0)
  line L0 (-5.5, -2.5) -> (-0.5, -2.5) construction
  line L1 (-5.5, -7.5) -> (-0.5, -7.5) construction
  line L2 (-1.5028, -3.1972) -> (-2.0028, -3.1972) construction
  line L3 (-4.5028, -3.1972) -> (-2.5028, -3.1972) construction
  line L4 (-1.7528, -3.1972) -> (-3.5028, -3.1972) construction
  arc A0 (-1.7528, -3.1972) -> (-3.5028, -3.1972) centre (-2.6278, -3.1972) ccw
  point P0 (0, 0)
sweep "Sweep1" add profiles "Sketch4" path "Sketch5" separate body contours A0
sketch "Skizze8" plane through (1.93, 0.25, -19.18) normal (0, 0, -1) x (-1, 0, 0)
  line L0 (0.4, -0.5) -> (0.4, 0) projected
  line L1 (0, 0) -> (0.4, 0) projected
  line L2 (0, -0.5) -> (0, 0) projected
  line L3 (0.4, -0.5) -> (0, -0.5) projected
  line L4 (-2.14, -0.5) -> (-2.14, 0) projected
  line L5 (-2.54, 0) -> (-2.14, 0) projected
  line L6 (-2.54, -0.5) -> (-2.54, 0) projected
  line L7 (-2.14, -0.5) -> (-2.54, -0.5) projected
  point P0 (1.93, -0.25)
  point P1 (0.2, -0.25)
  point P2 (-2.34, -0.25)
  point P3 (0.2, -0.5)
  point P4 (-2.34, -0.5)
  point P5 (0.4, -0.25)
  point P6 (-2.14, -0.25)
extrude "Extrusion3" add sketch "Skizze8" along normal blind 5 contours L3 L2 L1 L0 bodies 3
extrude "Extrusion4" add sketch "Skizze8" along normal blind 5 from surface at 1 contours L7 L6 L5 L4 bodies 3
equation "\"d10\" = Diameter_Led"
equation "\"d13\" = Diameter_Led"
equation "\"d20\" = 0.5 * Jarak_Kaki"
equation "\"Diameter_Led\" = 5"
properties part number "LED - green"
